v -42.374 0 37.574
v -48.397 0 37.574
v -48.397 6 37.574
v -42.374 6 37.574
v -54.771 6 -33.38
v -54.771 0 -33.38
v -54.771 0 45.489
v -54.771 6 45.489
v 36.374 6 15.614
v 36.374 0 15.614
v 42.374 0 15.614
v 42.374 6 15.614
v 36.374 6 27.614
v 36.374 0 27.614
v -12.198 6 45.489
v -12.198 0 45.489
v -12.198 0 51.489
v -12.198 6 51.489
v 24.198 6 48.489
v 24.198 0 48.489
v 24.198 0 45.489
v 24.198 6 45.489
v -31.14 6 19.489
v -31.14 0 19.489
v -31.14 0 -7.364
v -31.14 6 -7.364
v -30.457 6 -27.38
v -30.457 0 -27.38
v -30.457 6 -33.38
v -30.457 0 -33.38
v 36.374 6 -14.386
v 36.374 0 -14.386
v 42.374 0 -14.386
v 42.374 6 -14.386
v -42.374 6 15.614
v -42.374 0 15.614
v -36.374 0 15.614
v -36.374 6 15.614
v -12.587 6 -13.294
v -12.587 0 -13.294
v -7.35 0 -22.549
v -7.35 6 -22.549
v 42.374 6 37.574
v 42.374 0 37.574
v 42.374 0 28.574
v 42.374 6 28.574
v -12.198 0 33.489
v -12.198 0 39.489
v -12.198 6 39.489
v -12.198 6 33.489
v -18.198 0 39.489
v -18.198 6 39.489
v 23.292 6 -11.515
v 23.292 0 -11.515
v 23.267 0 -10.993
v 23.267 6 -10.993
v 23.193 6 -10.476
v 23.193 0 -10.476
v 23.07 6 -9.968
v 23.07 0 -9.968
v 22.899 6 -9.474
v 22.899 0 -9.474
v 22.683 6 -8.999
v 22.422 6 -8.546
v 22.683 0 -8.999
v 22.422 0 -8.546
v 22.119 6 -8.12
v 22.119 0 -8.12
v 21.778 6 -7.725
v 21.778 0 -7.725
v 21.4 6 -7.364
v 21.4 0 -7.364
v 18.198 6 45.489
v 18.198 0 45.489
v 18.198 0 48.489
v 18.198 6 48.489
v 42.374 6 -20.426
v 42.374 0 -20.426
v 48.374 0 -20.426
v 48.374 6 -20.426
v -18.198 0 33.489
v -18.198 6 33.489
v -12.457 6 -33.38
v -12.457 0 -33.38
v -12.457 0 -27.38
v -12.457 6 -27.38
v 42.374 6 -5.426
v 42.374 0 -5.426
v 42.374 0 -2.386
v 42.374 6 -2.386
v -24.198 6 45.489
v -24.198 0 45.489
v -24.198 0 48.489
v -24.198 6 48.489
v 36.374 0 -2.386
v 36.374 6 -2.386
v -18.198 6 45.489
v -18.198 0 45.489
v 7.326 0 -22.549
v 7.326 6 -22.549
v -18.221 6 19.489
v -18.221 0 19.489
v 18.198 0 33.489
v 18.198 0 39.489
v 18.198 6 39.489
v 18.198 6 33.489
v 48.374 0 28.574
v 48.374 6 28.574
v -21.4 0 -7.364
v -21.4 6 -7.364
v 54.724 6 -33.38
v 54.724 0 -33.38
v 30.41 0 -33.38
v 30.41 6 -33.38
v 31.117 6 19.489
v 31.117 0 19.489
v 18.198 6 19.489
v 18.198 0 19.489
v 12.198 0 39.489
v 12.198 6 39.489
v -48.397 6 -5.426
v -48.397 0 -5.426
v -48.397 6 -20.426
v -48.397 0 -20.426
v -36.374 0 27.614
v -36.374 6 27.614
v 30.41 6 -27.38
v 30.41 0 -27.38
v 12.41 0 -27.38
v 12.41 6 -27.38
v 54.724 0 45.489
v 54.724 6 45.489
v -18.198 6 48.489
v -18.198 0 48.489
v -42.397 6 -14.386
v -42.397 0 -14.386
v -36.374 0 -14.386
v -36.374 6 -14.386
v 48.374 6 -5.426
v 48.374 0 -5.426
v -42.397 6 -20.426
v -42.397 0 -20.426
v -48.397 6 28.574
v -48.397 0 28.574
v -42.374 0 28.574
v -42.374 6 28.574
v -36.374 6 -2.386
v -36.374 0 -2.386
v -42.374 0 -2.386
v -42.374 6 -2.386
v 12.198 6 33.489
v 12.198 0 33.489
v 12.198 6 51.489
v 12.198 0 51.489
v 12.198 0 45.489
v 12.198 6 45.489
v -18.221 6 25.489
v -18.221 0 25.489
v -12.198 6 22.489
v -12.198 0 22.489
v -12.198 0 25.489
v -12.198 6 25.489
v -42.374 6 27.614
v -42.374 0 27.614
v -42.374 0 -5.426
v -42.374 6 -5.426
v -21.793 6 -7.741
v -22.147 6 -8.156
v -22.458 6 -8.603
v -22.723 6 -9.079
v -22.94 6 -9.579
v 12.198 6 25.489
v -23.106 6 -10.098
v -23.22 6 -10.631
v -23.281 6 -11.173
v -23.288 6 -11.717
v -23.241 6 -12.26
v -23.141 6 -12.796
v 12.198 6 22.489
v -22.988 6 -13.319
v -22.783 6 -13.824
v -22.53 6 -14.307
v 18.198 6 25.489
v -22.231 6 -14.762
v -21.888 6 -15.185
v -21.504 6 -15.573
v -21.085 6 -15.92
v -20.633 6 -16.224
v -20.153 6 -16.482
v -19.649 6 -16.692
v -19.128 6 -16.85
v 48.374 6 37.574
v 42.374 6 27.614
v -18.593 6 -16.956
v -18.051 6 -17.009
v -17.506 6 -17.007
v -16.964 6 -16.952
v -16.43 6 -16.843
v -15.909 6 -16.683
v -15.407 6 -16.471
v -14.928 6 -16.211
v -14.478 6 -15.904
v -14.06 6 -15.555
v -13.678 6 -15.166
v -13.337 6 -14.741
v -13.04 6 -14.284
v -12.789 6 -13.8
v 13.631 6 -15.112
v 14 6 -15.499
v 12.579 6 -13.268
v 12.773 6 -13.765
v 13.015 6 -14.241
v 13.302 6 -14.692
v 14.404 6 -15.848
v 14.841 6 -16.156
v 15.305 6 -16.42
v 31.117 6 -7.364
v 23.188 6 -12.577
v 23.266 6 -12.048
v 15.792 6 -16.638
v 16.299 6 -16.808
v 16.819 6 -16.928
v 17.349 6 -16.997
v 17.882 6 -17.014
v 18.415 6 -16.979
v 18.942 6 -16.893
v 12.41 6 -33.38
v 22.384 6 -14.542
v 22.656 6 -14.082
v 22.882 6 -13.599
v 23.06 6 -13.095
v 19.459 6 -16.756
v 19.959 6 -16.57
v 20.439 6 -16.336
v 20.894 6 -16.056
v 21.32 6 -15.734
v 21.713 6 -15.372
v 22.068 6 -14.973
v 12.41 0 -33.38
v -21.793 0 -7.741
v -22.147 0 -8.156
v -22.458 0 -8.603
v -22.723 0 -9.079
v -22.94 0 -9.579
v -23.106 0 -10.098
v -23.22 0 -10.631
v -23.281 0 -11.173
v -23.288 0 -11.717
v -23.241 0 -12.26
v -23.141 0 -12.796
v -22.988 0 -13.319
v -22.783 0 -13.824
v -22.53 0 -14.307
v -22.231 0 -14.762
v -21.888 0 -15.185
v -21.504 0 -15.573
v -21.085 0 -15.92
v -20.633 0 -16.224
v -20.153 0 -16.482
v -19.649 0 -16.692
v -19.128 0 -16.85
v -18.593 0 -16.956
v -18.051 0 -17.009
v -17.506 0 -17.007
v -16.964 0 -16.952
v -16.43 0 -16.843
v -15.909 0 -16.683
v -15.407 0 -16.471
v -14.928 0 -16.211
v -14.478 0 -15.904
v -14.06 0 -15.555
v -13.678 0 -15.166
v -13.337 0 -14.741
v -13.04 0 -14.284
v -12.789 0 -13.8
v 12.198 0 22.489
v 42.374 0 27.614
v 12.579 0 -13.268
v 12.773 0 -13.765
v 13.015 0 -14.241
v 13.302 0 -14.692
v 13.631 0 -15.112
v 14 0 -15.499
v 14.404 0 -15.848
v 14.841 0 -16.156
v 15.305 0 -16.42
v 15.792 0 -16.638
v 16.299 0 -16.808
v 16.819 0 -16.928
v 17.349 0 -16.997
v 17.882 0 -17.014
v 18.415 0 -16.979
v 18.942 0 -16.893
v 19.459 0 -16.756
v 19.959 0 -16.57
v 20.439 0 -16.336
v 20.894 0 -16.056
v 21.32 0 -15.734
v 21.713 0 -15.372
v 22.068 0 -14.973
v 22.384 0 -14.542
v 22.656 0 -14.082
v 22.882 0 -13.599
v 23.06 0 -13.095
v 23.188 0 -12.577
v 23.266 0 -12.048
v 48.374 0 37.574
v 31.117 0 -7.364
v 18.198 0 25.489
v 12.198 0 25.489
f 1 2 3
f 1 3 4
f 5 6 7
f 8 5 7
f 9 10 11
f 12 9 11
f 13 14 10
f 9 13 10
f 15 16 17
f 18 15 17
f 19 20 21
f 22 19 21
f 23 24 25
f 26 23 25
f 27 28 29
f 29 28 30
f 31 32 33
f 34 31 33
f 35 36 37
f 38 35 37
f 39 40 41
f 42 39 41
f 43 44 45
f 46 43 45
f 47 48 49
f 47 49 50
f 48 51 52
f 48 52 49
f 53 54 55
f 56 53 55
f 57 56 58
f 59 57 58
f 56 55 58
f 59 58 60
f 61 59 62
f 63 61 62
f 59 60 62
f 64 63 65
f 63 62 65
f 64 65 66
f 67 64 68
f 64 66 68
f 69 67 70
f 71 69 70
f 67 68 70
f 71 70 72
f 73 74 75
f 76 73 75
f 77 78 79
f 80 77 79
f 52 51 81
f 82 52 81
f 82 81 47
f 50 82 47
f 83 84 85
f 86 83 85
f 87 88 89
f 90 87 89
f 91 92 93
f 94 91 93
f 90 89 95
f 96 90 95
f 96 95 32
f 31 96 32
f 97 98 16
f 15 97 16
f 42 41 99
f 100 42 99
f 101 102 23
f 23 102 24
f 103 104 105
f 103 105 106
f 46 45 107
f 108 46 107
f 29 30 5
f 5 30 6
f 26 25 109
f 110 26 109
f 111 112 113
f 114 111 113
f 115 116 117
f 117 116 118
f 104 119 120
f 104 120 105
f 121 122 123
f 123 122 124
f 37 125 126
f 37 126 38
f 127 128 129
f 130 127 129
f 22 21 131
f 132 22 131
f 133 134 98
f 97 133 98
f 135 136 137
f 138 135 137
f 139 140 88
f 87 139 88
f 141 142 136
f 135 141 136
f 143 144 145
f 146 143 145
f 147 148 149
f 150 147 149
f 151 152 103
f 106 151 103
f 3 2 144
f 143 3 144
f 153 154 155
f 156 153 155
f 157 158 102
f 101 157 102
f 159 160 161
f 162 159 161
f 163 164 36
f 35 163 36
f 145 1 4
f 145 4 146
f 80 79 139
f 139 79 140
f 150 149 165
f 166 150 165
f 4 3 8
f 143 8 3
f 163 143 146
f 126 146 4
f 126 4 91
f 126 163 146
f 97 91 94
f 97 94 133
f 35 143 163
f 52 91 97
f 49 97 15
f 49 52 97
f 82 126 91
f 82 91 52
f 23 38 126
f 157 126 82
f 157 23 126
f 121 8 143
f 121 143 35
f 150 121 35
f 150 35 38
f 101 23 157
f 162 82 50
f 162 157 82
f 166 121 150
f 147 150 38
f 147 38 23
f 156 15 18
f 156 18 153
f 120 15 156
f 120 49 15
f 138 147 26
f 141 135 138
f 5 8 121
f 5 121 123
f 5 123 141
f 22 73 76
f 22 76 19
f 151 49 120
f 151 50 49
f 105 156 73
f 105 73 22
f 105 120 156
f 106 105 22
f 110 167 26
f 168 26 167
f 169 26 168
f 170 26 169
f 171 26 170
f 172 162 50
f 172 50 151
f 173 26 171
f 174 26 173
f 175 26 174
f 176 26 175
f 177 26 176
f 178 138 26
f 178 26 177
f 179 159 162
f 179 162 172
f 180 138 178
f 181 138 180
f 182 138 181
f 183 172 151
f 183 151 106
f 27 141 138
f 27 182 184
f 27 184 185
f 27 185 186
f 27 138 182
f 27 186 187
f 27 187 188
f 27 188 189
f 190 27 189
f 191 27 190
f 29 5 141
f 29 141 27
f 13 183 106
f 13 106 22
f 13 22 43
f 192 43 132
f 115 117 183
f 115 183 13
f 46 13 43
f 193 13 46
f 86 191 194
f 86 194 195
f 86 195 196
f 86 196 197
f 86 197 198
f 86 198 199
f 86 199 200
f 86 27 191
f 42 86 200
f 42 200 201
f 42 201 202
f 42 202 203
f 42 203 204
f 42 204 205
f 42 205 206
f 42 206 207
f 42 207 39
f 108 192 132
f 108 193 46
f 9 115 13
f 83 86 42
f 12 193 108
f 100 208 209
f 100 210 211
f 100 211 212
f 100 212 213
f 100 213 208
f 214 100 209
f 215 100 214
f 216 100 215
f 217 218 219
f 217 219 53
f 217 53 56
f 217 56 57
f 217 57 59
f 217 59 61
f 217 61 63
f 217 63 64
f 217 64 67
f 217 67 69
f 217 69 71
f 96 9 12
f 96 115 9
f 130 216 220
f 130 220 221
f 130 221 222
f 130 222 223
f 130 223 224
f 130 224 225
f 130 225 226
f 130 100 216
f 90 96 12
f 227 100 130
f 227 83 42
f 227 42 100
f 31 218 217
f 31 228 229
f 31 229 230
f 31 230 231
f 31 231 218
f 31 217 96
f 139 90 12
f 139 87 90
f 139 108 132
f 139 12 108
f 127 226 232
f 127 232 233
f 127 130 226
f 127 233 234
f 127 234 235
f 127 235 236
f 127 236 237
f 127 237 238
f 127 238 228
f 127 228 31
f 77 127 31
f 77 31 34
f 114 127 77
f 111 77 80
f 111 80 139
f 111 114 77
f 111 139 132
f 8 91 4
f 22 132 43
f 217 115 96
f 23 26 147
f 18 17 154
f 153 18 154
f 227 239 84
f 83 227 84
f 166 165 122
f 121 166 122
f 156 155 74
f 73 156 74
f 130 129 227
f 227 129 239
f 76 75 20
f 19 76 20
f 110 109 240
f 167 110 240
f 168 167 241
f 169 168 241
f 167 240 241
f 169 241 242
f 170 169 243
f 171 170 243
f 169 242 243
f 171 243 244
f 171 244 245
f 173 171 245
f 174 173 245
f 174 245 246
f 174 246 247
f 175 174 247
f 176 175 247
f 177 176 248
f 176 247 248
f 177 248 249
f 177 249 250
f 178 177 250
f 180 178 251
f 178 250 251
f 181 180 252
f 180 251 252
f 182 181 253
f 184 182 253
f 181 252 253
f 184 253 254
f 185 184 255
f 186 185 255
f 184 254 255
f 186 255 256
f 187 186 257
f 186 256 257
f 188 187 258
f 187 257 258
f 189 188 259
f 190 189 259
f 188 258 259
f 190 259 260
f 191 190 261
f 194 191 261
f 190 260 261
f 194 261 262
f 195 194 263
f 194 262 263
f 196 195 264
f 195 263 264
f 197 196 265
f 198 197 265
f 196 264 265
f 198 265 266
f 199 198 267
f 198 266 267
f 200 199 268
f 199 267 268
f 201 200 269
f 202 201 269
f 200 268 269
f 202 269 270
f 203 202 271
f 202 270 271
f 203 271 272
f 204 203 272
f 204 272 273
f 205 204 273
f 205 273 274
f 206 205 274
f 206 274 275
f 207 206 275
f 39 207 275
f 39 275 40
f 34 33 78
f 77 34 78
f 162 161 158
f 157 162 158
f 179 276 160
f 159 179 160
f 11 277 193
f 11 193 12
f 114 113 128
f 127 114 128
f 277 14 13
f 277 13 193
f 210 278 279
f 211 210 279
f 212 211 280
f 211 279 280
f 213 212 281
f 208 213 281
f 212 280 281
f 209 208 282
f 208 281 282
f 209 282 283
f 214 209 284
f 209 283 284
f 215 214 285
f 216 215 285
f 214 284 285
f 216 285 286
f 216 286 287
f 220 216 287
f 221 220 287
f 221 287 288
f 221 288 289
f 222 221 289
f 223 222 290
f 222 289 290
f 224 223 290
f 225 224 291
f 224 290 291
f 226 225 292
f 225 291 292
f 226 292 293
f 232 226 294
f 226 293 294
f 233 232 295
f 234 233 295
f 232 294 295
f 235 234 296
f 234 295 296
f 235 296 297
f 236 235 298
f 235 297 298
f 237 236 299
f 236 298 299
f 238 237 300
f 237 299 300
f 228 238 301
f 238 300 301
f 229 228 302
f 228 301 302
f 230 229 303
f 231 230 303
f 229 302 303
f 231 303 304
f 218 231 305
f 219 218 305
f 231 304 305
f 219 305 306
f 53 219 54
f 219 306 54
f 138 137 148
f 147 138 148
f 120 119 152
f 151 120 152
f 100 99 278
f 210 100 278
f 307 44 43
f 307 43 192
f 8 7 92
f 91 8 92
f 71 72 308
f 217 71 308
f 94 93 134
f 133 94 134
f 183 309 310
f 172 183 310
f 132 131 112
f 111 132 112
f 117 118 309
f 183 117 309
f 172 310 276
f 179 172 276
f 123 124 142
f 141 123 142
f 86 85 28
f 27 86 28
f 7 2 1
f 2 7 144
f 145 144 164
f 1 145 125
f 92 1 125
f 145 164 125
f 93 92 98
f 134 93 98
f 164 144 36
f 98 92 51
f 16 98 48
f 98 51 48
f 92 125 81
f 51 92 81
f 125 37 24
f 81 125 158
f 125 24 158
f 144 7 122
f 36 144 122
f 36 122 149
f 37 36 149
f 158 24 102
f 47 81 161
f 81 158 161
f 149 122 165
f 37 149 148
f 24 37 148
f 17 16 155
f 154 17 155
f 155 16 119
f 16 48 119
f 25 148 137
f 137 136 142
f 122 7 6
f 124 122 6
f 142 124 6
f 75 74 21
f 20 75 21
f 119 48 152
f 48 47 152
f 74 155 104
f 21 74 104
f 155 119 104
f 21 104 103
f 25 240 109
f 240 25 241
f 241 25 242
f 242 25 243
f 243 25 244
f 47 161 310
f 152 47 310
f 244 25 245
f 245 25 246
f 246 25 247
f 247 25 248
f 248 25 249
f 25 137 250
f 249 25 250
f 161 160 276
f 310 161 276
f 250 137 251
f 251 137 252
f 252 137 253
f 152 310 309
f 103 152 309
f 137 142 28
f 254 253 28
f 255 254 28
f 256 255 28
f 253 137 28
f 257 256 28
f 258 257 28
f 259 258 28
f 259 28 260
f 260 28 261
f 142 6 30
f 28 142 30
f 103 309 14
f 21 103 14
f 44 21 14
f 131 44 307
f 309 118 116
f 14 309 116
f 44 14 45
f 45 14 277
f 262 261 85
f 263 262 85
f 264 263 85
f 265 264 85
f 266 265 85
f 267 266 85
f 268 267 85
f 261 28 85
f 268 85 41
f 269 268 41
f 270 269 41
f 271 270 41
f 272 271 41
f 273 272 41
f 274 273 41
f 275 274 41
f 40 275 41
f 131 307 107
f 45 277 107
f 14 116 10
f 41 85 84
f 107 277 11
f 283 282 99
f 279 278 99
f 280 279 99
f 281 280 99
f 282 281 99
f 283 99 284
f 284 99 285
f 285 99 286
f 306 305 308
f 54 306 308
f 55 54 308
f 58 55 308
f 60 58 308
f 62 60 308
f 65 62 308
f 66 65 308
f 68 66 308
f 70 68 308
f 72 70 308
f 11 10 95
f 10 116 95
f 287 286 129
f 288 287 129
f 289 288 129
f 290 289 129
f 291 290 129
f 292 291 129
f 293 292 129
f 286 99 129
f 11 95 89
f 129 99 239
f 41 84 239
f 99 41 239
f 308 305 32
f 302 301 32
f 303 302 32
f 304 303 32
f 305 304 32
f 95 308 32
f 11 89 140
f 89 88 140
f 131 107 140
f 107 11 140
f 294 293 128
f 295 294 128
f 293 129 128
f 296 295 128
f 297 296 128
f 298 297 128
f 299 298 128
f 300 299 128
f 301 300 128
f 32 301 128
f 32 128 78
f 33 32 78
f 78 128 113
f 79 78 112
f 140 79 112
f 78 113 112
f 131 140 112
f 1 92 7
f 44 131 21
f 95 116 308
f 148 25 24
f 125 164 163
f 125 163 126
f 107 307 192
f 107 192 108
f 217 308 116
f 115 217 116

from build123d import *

# Parameters (mm, degrees)
SKETCH1_W           = 6.023507921
SKETCH1_H           = 9
SKETCH1_W_2         = 6
SKETCH1_H_2         = 6
SKETCH1_H_3         = 12
BOSS_EXTRUDE1_DEPTH = 6


with BuildPart() as part:
    # Sketch1 → Boss-Extrude1 (new body)
    with BuildSketch(Plane(origin=(0, 0, 0), x_dir=(1, 0, 0), z_dir=(0, 1, 0))):
        Polygon((-30.457136098, 33.379680679), (-54.770597518, 33.379680679), (-54.770597518, -45.488511926), (-24.197851339, -45.488511926), (-24.197851339, -48.488511926), (-18.197851339, -48.488511926), (-18.197851339, -45.488511926), (-12.197851339, -45.488511926), (-12.197851339, -51.488511926), (12.197851339, -51.488511926), (12.197851339, -45.488511926), (18.197851339, -45.488511926), (18.197851339, -48.488511926), (24.197851339, -48.488511926), (24.197851339, -45.488511926), (54.723581676, -45.488511926), (54.723581676, 33.379680679), (30.410120257, 33.379680679), (30.410120257, 27.379680679), (12.410120257, 27.379680679), (12.410120257, 33.379680679), (-12.457136098, 33.379680679), (-12.457136098, 27.379680679), (-30.457136098, 27.379680679), align=None)
        with Locations((-45.385335637, -33.07427073)):
            Rectangle(SKETCH1_W, SKETCH1_H, mode=Mode.SUBTRACT)
        with Locations((-15.197851339, -36.488511926)):
            Rectangle(SKETCH1_W_2, SKETCH1_H_2, mode=Mode.SUBTRACT)
        with Locations((-39.373581676, -21.614283631)):
            Rectangle(SKETCH1_W_2, SKETCH1_H_3, mode=Mode.SUBTRACT)
        with Locations((15.197851339, -36.488511926)):
            Rectangle(SKETCH1_W_2, SKETCH1_H_2, mode=Mode.SUBTRACT)
        with Locations((45.373581676, -33.07427073)):
            Rectangle(SKETCH1_W_2, SKETCH1_H, mode=Mode.SUBTRACT)
        with Locations((39.373581676, -21.614283631)):
            Rectangle(SKETCH1_W_2, SKETCH1_H_3, mode=Mode.SUBTRACT)
        Polygon((-36.373581676, 2.385716369), (-42.373581676, 2.385716369), (-42.373581676, 5.42572927), (-48.397089597, 5.42572927), (-48.397089597, 20.42572927), (-42.397089597, 20.42572927), (-42.397089597, 14.385716369), (-36.373581676, 14.385716369), align=None, mode=Mode.SUBTRACT)
        with BuildLine():
            Line((-12.587492722, 13.293717765), (-7.349609214, 22.548897144))
            Line((-7.349609214, 22.548897144), (7.326101293, 22.548897144))
            Line((7.326101293, 22.548897144), (12.578685825, 13.267741508))
            ThreePointArc((12.578685825, 13.267741508), (18.679992808, 16.942587364), (23.291850895, 11.51476976))
            ThreePointArc((23.291850895, 11.51476976), (22.796616824, 9.23391071), (21.400098894, 7.363800429))
            Line((21.400098894, 7.363800429), (31.116785699, 7.363800429))
            Line((31.116785699, 7.363800429), (31.116785699, -19.488511926))
            Line((31.116785699, -19.488511926), (18.197851339, -19.488511926))
            Line((18.197851339, -19.488511926), (18.197851339, -25.488511926))
            Line((18.197851339, -25.488511926), (12.197851339, -25.488511926))
            Line((12.197851339, -25.488511926), (12.197851339, -22.488511926))
            Line((12.197851339, -22.488511926), (-12.197851339, -22.488511926))
            Line((-12.197851339, -22.488511926), (-12.197851339, -25.488511926))
            Line((-12.197851339, -25.488511926), (-18.221359259, -25.488511926))
            Line((-18.221359259, -25.488511926), (-18.221359259, -19.488511926))
            Line((-18.221359259, -19.488511926), (-31.140293619, -19.488511926))
            Line((-31.140293619, -19.488511926), (-31.140293619, 7.363800429))
            Line((-31.140293619, 7.363800429), (-21.400098894, 7.363800429))
            ThreePointArc((-21.400098894, 7.363800429), (-20.862334868, 16.077896777), (-12.587492722, 13.293717765))
        make_face(mode=Mode.SUBTRACT)
        Polygon((42.373581676, 2.385716369), (36.373581676, 2.385716369), (36.373581676, 14.385716369), (42.373581676, 14.385716369), (42.373581676, 20.42572927), (48.373581676, 20.42572927), (48.373581676, 5.42572927), (42.373581676, 5.42572927), align=None, mode=Mode.SUBTRACT)
    extrude(amount=BOSS_EXTRUDE1_DEPTH)


solid = part.part
